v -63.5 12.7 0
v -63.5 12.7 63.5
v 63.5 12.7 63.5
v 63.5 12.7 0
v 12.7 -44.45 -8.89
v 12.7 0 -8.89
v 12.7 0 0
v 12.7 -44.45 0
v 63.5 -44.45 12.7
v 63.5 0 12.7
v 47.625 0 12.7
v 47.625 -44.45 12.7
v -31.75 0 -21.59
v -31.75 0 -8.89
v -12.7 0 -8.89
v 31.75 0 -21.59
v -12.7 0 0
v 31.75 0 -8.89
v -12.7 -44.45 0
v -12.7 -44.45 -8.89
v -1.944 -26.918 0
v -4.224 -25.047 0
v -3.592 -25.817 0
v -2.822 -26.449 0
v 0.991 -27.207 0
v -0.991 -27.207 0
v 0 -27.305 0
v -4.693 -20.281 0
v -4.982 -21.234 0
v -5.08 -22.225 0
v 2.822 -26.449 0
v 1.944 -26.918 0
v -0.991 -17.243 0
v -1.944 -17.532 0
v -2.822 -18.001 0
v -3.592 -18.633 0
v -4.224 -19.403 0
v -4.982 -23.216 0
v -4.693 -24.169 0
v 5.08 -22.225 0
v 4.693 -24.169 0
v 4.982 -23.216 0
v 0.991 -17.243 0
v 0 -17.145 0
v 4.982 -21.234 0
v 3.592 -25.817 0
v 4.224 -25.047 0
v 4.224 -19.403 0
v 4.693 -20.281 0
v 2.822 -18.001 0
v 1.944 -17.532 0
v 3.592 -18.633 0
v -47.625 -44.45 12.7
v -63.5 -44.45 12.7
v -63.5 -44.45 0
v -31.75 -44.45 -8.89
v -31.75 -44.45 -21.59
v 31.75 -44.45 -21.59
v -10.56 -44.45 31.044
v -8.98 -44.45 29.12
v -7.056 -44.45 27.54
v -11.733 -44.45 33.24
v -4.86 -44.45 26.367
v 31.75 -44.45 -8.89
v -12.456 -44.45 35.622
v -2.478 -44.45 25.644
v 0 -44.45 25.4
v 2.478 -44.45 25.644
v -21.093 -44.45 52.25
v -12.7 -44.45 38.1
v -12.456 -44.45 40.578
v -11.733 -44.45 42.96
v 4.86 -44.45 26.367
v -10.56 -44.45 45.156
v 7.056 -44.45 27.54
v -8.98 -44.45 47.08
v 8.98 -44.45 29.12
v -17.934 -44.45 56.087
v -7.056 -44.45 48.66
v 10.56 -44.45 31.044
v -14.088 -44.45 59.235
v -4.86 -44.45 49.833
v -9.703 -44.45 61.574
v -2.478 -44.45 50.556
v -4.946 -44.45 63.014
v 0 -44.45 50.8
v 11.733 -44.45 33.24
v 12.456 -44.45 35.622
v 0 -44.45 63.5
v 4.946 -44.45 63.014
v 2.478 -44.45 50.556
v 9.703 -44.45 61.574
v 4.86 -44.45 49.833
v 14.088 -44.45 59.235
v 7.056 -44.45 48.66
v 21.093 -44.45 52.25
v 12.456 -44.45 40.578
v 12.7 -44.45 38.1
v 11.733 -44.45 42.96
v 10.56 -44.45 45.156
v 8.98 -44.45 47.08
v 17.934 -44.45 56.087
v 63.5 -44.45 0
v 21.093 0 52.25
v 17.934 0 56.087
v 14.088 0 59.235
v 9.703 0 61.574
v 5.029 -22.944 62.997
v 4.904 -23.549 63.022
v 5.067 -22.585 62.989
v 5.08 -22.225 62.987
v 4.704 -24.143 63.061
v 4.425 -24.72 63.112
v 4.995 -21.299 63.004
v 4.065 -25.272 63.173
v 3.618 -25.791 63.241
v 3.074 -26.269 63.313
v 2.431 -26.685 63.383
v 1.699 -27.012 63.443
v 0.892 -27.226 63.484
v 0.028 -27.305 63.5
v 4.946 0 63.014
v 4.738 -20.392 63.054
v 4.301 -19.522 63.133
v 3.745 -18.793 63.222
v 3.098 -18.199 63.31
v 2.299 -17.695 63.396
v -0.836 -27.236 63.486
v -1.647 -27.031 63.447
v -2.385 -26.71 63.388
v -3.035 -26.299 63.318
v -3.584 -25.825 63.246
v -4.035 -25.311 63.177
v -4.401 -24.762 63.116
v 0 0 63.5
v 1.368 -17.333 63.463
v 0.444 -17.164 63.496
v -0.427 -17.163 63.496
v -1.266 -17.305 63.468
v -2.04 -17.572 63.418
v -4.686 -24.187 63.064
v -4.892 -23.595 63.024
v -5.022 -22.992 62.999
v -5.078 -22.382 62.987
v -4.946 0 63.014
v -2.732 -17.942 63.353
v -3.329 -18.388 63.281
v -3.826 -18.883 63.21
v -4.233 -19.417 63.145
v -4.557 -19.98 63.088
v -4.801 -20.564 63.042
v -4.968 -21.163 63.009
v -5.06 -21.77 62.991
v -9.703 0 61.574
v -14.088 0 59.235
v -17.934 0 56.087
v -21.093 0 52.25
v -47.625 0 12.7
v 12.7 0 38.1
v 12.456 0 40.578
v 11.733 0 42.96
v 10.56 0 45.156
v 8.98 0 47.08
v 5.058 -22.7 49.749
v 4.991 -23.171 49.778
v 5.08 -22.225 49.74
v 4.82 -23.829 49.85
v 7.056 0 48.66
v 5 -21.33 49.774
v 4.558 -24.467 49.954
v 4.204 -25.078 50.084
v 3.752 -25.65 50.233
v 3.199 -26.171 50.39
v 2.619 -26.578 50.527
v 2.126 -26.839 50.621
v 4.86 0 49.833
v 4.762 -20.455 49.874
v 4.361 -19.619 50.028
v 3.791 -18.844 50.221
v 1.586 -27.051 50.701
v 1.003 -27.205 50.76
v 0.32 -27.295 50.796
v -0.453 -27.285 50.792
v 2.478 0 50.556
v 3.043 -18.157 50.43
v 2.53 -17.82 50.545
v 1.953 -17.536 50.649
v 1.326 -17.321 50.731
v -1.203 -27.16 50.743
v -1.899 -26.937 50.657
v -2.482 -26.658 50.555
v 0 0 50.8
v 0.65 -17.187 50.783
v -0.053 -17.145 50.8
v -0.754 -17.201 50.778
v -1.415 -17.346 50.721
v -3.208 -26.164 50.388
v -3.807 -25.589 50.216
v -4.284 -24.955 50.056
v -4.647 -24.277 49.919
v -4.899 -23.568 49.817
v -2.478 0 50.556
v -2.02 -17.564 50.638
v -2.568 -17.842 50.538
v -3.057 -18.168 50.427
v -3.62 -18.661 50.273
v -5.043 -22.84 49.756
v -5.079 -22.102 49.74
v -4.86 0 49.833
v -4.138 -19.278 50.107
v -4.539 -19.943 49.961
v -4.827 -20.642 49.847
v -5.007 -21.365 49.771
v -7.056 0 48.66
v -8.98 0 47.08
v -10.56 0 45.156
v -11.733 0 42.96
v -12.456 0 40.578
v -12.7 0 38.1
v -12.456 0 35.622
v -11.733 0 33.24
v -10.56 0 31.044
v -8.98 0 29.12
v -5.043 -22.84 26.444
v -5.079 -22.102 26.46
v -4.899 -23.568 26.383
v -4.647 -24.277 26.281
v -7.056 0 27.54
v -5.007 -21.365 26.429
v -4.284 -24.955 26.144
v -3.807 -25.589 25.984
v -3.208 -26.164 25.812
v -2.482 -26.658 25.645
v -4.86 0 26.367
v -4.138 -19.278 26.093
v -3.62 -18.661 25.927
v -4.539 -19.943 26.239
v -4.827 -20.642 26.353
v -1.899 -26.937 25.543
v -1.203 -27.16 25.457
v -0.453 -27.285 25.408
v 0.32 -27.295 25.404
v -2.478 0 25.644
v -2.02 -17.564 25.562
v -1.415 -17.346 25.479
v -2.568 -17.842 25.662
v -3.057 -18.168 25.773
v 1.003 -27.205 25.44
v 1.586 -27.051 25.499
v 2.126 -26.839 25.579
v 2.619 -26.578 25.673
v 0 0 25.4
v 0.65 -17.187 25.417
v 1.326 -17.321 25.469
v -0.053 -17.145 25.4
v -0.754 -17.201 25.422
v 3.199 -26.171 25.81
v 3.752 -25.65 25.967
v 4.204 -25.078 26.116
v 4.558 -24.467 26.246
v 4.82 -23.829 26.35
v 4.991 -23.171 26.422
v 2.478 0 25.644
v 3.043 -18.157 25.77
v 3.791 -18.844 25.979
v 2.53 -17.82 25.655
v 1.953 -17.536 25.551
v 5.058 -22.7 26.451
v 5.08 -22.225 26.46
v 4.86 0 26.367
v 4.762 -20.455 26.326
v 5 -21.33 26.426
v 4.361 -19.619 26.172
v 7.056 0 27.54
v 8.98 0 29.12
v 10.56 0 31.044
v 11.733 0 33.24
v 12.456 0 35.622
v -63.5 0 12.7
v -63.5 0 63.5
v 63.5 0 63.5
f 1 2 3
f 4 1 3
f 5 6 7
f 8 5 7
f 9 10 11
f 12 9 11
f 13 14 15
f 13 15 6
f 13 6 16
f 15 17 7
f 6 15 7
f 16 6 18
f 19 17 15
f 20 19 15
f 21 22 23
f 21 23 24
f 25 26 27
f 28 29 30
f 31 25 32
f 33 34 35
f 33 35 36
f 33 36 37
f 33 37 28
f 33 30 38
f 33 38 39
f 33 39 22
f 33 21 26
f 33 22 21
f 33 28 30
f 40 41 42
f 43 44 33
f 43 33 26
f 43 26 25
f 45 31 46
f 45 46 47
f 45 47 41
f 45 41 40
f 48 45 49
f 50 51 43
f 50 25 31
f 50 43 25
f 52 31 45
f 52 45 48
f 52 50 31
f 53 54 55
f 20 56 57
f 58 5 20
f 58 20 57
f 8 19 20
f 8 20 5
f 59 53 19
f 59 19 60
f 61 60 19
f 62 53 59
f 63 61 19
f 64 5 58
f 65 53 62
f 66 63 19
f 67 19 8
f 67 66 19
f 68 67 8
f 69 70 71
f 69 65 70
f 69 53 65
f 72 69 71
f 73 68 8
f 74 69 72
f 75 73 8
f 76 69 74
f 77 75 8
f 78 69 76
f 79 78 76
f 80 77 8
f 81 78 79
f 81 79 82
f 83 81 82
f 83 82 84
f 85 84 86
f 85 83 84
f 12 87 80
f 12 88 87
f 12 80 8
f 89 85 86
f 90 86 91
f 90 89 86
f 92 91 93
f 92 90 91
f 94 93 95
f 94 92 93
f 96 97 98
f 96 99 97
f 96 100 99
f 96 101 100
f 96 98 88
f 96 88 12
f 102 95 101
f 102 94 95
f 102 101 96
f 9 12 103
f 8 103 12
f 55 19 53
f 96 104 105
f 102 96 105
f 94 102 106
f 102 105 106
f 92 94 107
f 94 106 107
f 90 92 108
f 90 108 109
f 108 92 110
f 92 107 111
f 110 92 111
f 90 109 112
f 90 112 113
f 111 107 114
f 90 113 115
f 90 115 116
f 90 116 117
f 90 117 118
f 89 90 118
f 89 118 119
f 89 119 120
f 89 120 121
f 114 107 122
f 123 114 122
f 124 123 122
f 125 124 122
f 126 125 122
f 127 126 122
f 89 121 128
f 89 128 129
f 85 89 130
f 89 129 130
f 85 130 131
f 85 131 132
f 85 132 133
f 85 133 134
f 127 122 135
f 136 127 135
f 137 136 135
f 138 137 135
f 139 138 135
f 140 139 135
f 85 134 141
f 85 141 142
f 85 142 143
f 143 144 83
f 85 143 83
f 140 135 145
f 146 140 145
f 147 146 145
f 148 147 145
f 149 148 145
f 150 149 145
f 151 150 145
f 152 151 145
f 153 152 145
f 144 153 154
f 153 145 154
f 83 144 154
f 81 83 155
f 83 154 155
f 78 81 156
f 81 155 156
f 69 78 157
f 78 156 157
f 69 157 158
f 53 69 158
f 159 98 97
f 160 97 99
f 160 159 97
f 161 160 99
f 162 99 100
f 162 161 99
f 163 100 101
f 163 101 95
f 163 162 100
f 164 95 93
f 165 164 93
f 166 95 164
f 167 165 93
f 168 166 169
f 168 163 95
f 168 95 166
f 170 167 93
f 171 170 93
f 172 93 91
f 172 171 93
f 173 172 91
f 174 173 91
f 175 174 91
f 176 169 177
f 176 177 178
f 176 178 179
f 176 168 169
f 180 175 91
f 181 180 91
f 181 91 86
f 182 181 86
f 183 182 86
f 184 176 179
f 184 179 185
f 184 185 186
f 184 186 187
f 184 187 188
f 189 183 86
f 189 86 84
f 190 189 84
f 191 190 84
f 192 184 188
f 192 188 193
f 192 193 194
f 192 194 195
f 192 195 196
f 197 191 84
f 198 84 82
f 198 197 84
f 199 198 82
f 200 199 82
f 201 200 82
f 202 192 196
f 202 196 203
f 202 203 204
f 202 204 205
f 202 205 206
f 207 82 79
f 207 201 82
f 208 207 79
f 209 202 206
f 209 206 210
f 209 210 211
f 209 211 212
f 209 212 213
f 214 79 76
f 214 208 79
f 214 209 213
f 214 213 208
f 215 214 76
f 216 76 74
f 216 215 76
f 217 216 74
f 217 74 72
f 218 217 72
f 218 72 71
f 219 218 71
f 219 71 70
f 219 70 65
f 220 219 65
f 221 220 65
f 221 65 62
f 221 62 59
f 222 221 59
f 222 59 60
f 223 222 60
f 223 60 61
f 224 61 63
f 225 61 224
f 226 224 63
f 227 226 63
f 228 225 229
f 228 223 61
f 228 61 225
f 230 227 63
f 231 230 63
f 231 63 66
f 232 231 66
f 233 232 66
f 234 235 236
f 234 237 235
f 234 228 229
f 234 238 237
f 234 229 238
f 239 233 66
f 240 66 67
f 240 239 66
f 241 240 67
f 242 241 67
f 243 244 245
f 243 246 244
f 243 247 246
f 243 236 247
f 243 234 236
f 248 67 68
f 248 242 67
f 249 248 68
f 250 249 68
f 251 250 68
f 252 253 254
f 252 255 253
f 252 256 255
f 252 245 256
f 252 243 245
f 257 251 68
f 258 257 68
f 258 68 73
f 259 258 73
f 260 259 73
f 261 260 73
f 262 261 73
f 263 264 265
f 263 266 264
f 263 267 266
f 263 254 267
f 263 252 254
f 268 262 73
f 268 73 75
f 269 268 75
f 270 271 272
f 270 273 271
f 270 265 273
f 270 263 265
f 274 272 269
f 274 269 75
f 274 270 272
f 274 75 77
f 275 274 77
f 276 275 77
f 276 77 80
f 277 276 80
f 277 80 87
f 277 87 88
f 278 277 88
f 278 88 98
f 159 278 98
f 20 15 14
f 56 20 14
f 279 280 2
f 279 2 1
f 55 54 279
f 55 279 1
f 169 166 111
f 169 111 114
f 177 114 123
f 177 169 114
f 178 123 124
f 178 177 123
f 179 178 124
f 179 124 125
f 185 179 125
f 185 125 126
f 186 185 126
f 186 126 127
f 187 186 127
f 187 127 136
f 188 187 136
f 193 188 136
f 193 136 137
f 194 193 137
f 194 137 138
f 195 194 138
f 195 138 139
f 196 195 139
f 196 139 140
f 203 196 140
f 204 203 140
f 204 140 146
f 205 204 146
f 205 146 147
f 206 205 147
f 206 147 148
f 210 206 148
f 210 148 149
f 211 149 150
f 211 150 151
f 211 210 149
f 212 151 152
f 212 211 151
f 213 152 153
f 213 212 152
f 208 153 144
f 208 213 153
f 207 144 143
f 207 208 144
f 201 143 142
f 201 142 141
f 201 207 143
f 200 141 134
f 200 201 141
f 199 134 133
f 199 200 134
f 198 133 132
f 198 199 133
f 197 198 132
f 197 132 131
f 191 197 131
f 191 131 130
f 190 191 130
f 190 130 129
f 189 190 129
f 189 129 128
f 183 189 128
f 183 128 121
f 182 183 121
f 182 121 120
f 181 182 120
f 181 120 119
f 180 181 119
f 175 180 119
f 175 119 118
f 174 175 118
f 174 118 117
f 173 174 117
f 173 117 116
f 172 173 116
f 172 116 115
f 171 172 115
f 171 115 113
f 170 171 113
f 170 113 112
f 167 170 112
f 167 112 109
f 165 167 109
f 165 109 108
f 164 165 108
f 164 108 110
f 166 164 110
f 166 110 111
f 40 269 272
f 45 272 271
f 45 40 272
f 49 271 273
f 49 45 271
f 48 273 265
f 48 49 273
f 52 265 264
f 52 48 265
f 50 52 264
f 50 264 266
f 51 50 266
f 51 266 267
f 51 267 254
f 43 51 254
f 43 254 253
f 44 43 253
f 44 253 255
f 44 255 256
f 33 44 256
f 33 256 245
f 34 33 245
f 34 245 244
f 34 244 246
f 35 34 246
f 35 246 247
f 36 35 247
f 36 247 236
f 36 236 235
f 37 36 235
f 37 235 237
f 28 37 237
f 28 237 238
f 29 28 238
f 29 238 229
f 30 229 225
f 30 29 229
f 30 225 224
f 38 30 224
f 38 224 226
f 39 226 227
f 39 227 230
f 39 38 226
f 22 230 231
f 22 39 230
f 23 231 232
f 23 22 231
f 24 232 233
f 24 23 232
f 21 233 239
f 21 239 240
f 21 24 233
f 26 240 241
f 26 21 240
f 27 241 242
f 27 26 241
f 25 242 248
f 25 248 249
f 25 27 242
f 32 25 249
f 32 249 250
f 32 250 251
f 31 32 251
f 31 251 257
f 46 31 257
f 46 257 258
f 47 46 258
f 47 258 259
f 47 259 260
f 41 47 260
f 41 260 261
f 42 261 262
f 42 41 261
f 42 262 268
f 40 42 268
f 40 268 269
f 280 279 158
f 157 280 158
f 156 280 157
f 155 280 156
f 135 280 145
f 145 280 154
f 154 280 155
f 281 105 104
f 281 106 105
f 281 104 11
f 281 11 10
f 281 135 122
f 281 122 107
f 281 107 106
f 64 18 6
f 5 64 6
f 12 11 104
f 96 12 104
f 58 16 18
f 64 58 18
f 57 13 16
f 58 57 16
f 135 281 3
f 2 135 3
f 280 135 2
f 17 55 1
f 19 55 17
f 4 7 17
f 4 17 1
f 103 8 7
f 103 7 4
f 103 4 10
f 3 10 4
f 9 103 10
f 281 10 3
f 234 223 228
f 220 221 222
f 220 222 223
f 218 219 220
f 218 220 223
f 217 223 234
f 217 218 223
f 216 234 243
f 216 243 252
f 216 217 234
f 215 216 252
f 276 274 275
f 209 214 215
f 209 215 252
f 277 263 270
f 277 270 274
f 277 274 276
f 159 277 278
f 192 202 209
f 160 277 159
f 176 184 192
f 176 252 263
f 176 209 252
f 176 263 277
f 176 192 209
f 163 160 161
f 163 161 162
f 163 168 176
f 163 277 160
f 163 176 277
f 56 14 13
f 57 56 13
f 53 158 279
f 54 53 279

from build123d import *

# Parameters (mm, degrees)
F0_R     = 12.7
F1_DEPTH = 44.45
F3_DEPTH = 12.7
F4_R     = 5.08
F5_DEPTH = 63.501


with BuildPart() as f1:
    # F0 (on Front) → F1 (new body)
    with BuildSketch(Plane.XZ):
        with BuildLine():
            Line((-31.75, -8.89), (-31.75, -21.59))
            Line((-31.75, -21.59), (0, -21.59))
            Line((0, -21.59), (31.75, -21.59))
            Line((31.75, -21.59), (31.75, -8.89))
            Line((31.75, -8.89), (12.7, -8.89))
            Line((12.7, -8.89), (12.7, 0))
            Line((12.7, 0), (63.5, 0))
            Line((63.5, 0), (63.5, 12.7))
            Line((63.5, 12.7), (47.625, 12.7))
            Line((47.625, 12.7), (21.093426, 52.250173))
            ThreePointArc((21.093426, 52.250173), (0, 63.5), (-21.093426, 52.250173))
            Line((-21.093426, 52.250173), (-47.625, 12.7))
            Line((-47.625, 12.7), (-63.5, 12.7))
            Line((-63.5, 12.7), (-63.5, 0))
            Line((-63.5, 0), (-12.7, 0))
            Line((-12.7, 0), (-12.7, -8.89))
            Line((-12.7, -8.89), (-31.75, -8.89))
        make_face()
        with Locations((0, 38.1)):
            Circle(F0_R, mode=Mode.SUBTRACT)
    extrude(amount=F1_DEPTH)

    # F2 (on Front) → F3 (join)
    with BuildSketch(Plane.XZ):
        Polygon((-63.5, 63.5), (-63.5, 0), (-12.7, 0), (12.7, 0), (63.5, 0), (63.5, 63.5), align=None)
    extrude(amount=-F3_DEPTH)

    # F4 (on Top) → F5 (cut, through all)
    with BuildSketch(Plane.XY):
        with Locations((0, -22.225)):
            Circle(F4_R)
    extrude(amount=F5_DEPTH, mode=Mode.SUBTRACT)


solid = f1.part
